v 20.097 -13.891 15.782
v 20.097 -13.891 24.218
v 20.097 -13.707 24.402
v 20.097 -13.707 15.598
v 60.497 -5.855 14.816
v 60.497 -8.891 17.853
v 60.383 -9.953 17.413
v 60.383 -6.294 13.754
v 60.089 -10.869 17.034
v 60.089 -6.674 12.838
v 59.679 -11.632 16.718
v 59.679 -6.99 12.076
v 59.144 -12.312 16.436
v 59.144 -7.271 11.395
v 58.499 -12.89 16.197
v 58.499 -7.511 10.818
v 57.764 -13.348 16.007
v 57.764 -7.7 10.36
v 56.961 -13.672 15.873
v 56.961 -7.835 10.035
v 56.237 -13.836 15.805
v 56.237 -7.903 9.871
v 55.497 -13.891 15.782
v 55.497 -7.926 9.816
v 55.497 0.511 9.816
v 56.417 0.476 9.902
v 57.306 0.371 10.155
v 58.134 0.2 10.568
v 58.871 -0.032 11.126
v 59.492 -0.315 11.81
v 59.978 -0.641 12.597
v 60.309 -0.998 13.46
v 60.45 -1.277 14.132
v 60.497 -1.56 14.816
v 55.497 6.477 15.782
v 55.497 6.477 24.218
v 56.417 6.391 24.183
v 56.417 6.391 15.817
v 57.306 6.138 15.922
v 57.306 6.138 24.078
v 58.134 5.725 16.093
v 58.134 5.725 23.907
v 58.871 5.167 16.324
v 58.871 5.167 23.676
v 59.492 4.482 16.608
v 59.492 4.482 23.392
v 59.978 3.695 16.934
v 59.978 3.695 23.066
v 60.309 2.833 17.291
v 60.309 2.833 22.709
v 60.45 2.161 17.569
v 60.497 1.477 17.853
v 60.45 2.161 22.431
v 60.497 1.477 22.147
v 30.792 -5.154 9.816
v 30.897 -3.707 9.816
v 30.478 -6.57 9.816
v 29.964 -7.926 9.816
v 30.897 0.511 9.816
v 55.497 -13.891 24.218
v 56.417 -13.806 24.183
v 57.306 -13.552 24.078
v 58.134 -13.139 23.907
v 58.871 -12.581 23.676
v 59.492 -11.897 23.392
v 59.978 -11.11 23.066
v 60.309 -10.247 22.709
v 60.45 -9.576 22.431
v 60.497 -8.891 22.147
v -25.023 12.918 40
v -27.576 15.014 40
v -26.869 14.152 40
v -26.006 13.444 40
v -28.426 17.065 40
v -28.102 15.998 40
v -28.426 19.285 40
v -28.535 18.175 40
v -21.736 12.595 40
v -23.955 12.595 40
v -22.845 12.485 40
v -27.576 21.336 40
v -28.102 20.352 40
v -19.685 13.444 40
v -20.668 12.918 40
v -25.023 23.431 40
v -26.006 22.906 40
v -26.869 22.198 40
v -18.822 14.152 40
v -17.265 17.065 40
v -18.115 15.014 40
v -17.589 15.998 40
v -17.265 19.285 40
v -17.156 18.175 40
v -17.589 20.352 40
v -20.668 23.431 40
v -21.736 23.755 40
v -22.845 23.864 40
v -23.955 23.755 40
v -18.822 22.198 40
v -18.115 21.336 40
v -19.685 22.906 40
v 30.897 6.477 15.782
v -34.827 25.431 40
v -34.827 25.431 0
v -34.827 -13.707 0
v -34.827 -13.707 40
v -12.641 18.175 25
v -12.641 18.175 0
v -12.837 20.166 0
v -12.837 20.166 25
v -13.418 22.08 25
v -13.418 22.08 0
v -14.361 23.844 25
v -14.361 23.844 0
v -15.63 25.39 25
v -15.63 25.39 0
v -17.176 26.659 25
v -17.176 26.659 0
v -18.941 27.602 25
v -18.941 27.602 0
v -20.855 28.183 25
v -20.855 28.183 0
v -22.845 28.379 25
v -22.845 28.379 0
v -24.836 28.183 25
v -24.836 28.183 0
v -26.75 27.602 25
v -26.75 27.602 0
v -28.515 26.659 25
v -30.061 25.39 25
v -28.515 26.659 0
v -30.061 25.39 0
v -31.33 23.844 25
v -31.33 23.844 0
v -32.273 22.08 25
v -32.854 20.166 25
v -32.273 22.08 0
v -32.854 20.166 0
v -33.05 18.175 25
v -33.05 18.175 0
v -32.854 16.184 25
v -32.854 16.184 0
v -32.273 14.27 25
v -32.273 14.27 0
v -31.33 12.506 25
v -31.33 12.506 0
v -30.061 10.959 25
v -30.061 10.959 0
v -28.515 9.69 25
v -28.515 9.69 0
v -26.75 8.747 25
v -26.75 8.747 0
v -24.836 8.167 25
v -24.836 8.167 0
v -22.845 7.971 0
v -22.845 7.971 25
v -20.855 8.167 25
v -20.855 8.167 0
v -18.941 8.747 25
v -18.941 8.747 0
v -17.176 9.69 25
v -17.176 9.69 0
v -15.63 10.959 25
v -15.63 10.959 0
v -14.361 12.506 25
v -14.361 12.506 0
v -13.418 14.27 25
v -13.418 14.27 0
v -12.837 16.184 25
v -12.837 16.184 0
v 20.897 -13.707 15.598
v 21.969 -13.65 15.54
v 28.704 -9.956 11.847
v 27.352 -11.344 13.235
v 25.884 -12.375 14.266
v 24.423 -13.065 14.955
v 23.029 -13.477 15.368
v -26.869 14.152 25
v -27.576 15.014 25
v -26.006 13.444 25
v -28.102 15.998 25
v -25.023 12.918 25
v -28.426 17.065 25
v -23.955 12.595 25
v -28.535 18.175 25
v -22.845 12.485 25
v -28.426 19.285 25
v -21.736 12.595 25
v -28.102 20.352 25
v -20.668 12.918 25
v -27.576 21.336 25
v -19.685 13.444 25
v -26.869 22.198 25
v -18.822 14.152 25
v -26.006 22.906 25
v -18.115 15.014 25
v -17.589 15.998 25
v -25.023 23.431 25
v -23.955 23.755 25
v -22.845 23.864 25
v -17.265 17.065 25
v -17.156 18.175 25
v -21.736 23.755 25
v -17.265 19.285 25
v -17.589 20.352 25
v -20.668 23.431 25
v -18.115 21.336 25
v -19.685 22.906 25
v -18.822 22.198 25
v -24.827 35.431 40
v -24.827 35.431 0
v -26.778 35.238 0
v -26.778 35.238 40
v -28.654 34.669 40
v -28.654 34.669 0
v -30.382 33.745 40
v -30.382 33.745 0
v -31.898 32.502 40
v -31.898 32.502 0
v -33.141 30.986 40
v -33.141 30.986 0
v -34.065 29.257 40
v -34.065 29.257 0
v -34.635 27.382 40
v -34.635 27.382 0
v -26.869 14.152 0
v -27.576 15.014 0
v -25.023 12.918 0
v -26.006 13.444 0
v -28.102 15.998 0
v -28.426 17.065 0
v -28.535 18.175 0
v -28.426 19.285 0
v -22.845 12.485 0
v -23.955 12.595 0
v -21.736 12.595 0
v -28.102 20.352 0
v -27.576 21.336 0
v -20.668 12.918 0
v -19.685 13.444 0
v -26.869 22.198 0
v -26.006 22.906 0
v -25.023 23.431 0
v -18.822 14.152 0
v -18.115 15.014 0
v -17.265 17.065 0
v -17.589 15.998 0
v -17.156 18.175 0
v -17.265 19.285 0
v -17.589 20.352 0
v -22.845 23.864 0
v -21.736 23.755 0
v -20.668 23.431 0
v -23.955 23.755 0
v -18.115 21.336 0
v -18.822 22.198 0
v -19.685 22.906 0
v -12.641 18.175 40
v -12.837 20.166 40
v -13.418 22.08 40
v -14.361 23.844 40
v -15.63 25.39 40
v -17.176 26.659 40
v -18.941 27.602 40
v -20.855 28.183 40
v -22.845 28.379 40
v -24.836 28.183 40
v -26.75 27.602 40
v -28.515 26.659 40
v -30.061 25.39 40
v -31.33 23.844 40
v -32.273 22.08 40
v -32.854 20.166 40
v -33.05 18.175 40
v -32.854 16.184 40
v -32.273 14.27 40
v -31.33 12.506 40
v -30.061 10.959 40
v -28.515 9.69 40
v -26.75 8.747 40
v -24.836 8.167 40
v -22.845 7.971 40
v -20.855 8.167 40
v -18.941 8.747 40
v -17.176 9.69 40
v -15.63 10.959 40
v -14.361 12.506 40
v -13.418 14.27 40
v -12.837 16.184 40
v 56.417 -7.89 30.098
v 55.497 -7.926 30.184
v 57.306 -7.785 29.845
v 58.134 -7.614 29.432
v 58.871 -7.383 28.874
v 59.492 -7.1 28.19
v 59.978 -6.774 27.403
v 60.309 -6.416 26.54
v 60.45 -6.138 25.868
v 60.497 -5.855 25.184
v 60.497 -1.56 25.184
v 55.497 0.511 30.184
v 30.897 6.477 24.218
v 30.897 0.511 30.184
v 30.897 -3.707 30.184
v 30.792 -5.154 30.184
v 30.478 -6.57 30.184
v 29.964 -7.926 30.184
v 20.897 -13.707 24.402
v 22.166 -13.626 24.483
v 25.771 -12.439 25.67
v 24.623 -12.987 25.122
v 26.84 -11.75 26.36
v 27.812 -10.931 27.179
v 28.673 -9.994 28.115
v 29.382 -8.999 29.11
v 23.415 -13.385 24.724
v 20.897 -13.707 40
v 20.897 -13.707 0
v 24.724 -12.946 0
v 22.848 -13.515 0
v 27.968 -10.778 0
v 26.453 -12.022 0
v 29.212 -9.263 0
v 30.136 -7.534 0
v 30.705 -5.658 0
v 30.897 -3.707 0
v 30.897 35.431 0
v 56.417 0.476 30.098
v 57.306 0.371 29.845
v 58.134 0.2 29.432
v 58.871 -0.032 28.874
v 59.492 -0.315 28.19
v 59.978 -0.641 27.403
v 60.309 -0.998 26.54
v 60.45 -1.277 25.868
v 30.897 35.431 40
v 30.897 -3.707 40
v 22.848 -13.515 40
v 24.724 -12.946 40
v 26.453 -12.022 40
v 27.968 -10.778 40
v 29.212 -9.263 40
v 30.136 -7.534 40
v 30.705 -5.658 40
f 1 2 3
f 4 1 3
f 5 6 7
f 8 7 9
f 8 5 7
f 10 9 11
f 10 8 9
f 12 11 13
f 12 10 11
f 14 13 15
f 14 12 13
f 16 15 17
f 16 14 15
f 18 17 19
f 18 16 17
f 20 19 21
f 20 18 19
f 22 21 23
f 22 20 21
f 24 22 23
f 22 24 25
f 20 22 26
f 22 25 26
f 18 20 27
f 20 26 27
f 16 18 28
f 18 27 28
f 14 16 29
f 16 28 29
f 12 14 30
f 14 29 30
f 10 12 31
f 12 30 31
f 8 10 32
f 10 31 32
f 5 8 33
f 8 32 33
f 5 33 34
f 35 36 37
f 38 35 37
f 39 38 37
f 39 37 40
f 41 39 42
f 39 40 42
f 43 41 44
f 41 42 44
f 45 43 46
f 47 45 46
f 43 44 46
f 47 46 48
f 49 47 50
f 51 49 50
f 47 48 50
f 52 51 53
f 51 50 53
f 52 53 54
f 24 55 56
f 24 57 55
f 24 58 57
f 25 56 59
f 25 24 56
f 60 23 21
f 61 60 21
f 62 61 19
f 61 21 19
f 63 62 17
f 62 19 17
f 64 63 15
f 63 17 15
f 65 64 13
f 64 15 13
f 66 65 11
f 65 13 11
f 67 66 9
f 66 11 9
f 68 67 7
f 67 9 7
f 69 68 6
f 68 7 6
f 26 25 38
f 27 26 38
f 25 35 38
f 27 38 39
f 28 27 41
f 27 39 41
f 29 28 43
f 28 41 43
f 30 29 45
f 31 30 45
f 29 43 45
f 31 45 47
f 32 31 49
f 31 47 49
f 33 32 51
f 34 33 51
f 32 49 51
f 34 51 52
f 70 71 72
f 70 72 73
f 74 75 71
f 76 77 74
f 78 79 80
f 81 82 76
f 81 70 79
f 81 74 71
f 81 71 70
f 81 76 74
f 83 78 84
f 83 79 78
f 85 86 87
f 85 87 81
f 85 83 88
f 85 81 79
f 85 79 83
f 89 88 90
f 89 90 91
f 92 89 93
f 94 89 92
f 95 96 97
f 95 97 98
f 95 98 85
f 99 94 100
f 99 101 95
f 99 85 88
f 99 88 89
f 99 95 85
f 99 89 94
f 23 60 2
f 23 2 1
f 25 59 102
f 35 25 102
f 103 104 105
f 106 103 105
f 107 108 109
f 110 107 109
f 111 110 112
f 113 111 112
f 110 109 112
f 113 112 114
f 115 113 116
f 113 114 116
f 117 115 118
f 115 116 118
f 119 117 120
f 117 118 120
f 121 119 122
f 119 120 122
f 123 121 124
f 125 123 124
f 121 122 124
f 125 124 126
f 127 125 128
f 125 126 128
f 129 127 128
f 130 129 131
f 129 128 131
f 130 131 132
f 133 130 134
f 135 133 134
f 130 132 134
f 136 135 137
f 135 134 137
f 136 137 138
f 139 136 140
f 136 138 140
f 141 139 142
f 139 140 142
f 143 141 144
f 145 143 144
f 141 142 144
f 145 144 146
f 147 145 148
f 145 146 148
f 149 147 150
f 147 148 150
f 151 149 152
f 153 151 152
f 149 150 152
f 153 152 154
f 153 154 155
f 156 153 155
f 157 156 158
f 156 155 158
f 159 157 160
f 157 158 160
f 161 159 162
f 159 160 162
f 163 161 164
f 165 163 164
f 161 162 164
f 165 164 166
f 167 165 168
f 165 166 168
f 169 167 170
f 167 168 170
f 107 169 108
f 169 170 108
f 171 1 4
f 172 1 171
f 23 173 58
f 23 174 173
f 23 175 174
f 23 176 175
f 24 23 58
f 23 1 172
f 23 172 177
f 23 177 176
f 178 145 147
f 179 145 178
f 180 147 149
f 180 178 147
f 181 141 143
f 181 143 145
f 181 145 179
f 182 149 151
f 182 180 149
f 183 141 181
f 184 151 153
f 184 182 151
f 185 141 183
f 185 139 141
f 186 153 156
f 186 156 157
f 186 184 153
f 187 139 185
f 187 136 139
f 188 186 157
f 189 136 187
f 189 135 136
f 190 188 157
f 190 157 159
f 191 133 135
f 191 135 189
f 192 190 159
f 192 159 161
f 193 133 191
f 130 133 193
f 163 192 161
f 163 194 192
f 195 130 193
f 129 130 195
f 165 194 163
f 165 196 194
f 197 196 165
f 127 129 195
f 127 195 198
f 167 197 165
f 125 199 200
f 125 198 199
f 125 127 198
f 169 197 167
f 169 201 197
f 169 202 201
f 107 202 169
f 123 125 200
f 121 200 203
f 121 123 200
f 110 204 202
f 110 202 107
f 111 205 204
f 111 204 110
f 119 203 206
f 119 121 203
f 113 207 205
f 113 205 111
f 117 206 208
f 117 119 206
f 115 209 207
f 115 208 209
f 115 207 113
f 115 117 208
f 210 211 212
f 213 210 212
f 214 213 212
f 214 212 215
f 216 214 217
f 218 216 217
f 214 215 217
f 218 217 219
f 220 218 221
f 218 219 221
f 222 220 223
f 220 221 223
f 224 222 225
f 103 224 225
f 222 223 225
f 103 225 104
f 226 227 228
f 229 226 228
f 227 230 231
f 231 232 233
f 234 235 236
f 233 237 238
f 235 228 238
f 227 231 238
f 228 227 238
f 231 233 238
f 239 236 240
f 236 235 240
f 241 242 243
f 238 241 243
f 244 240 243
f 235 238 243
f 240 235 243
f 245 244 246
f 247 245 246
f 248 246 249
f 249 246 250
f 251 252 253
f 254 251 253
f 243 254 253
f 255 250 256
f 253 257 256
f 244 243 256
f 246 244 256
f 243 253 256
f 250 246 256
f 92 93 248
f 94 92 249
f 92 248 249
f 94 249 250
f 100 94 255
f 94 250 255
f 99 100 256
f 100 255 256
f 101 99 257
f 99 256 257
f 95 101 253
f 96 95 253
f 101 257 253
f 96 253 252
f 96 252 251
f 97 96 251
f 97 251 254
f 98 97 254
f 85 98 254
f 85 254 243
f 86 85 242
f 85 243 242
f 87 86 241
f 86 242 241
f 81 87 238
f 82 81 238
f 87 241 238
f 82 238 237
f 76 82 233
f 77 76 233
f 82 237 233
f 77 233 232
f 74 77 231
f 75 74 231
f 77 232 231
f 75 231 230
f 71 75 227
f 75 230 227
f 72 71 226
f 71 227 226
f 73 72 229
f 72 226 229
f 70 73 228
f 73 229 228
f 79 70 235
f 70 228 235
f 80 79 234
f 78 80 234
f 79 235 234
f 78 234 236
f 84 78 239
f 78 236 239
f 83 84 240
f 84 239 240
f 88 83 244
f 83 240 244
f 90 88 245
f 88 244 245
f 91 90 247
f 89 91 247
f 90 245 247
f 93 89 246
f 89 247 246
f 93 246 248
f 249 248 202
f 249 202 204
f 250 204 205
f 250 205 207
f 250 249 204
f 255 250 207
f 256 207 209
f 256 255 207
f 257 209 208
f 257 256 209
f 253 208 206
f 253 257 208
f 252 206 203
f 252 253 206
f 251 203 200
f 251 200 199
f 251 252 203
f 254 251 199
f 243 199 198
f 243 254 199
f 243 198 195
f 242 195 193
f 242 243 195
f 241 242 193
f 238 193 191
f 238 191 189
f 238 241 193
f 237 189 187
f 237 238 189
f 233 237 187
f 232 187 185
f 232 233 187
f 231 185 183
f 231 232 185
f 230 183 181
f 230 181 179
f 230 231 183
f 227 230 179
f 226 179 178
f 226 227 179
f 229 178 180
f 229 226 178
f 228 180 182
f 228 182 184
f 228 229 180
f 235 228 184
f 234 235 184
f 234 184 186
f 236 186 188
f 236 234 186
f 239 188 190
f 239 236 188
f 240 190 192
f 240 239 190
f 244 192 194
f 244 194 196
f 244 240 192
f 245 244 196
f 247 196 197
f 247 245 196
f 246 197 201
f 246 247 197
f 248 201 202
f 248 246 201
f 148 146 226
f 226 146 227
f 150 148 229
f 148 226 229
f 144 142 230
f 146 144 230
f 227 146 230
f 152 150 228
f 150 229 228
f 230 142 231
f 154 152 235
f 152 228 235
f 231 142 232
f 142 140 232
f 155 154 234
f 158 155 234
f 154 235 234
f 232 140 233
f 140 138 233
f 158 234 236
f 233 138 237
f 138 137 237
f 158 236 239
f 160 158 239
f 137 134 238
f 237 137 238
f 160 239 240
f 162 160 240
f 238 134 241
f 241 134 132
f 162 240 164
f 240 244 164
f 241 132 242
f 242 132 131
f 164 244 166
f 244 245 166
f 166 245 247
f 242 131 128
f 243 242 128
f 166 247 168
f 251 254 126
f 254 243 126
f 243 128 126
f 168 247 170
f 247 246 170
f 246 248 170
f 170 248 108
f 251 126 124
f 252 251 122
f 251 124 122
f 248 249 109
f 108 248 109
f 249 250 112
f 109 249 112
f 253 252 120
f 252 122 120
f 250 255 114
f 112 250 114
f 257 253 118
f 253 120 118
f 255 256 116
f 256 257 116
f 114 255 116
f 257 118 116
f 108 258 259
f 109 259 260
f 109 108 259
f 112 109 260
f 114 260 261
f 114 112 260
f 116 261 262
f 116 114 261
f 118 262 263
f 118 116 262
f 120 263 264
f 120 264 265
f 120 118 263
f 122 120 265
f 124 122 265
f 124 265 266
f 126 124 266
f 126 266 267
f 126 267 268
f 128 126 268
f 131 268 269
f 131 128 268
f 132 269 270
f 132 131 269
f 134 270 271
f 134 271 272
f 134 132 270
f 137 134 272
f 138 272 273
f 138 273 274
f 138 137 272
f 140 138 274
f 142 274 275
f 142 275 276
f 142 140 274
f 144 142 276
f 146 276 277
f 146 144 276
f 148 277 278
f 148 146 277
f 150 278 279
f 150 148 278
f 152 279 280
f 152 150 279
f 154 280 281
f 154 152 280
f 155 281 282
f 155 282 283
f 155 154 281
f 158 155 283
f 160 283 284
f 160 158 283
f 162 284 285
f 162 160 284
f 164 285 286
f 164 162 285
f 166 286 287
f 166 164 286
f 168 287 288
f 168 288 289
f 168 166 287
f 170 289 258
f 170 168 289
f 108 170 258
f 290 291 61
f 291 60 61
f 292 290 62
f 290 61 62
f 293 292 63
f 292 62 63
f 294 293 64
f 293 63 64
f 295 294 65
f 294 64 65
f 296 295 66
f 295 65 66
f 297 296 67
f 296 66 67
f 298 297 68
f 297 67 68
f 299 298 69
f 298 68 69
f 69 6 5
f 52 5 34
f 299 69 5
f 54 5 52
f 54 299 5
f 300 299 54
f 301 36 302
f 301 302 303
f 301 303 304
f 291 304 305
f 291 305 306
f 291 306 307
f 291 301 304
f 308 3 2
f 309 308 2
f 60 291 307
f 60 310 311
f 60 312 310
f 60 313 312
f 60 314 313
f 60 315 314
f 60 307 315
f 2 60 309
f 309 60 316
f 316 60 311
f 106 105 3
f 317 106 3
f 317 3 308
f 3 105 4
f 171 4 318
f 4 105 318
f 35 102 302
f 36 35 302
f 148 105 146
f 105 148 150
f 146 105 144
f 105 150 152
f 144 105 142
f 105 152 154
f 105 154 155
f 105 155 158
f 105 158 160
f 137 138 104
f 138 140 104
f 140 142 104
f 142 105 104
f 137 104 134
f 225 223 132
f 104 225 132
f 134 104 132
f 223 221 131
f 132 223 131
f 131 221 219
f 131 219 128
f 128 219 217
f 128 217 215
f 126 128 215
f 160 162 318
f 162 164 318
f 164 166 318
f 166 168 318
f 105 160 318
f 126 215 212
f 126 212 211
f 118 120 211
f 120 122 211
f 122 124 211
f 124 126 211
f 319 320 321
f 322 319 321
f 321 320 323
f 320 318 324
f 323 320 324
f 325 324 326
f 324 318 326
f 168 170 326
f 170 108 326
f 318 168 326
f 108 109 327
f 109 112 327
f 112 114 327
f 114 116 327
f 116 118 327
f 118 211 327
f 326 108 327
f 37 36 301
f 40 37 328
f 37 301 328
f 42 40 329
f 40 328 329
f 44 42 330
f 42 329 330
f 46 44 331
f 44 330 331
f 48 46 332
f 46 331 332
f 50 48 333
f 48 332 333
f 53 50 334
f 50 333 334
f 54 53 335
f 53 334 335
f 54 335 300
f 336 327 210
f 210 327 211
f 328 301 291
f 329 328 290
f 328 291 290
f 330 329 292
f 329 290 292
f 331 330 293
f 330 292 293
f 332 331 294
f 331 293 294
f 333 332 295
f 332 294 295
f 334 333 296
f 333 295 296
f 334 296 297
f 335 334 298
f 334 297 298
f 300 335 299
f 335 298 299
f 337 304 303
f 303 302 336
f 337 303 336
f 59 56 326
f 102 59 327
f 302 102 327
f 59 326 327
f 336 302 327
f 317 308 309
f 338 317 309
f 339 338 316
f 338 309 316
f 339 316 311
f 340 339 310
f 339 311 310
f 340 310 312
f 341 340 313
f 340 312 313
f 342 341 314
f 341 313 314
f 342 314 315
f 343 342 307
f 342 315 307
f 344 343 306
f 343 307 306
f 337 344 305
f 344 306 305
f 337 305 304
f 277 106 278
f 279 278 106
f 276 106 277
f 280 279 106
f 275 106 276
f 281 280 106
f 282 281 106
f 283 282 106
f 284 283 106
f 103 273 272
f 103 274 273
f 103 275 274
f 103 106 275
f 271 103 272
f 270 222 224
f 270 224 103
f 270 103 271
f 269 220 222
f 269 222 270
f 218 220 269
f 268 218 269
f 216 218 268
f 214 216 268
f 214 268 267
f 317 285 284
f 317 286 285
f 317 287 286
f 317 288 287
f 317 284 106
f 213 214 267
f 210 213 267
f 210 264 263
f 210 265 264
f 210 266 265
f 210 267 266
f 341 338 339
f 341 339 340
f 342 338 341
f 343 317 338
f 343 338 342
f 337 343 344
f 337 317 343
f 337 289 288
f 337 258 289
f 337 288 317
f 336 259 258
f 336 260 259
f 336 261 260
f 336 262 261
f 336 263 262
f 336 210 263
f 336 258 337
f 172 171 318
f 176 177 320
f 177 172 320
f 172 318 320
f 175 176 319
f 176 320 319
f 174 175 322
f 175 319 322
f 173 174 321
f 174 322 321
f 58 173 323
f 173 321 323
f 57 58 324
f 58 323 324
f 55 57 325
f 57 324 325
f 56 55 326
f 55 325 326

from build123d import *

# Parameters (mm, degrees)
F0_R          = 10.204194
F0_R_2        = 5.689615
F1_DEPTH      = 40
F2_DEPTH      = 25
F4_DEPTH      = 29.6
F4_DEPTH_BACK = 10.8
F5_R          = 5


with BuildPart() as f1:
    # F0 (on Top) → F1 (new body)
    with BuildSketch(Plane.XY):
        with BuildLine():
            Line((30.896839, 35.430623), (-24.826688, 35.430623))
            ThreePointArc((-24.826688, 35.430623), (-31.897756, 32.501691), (-34.826688, 25.430623))
            Line((-34.826688, 25.430623), (-34.826688, -13.707297))
            Line((-34.826688, -13.707297), (20.896839, -13.707297))
            ThreePointArc((20.896839, -13.707297), (27.967907, -10.778365), (30.896839, -3.707297))
            Line((30.896839, -3.707297), (30.896839, 35.430623))
        make_face()
        with Locations((-22.845495, 18.174861)):
            Circle(F0_R, mode=Mode.SUBTRACT)
        with Locations((-22.845495, 18.174861)):
            Circle(F0_R_2)
    extrude(amount=F1_DEPTH)

    # F3 (on face) → F4 (join, two sides)
    with BuildSketch(Plane.YZ.offset(30.896839)) as f4_sk:
        Polygon((-13.89118, 24.218303), (-13.89118, 15.781697), (-7.925599, 9.816117), (-3.707297, 9.816117), (-3.707297, 30.183883), (-7.925599, 30.183883), align=None)
        Polygon((-3.707297, 30.183883), (-3.707297, 9.816117), (0.511006, 9.816117), (6.476586, 15.781697), (6.476586, 24.218303), (0.511006, 30.183883), align=None)
    extrude(amount=F4_DEPTH)
    extrude(f4_sk.sketch, amount=-F4_DEPTH_BACK)

    # F5
    f5_edges = [f1.edges().sort_by_distance(p)[0] for p in [
        (60.496839, -10.90839, 12.798907),
        (60.496839, -3.707297, 9.816117),
        (60.496839, -13.89118, 20),
        (60.496839, -10.90839, 27.201093),
        (60.496839, -3.707297, 30.183883),
        (60.496839, 3.493796, 12.798907),
        (60.496839, 6.476586, 20),
        (60.496839, 3.493796, 27.201093),
    ]]
    fillet(f5_edges, radius=F5_R)


with BuildPart() as f2:
    # F0 (on Top) → F2 (new body)
    with BuildSketch(Plane.XY):
        with Locations((-22.845495, 18.174861)):
            Circle(F0_R)
        with Locations((-22.845495, 18.174861)):
            Circle(F0_R_2, mode=Mode.SUBTRACT)
    extrude(amount=F2_DEPTH)


solid = Compound([f1.part, f2.part])
